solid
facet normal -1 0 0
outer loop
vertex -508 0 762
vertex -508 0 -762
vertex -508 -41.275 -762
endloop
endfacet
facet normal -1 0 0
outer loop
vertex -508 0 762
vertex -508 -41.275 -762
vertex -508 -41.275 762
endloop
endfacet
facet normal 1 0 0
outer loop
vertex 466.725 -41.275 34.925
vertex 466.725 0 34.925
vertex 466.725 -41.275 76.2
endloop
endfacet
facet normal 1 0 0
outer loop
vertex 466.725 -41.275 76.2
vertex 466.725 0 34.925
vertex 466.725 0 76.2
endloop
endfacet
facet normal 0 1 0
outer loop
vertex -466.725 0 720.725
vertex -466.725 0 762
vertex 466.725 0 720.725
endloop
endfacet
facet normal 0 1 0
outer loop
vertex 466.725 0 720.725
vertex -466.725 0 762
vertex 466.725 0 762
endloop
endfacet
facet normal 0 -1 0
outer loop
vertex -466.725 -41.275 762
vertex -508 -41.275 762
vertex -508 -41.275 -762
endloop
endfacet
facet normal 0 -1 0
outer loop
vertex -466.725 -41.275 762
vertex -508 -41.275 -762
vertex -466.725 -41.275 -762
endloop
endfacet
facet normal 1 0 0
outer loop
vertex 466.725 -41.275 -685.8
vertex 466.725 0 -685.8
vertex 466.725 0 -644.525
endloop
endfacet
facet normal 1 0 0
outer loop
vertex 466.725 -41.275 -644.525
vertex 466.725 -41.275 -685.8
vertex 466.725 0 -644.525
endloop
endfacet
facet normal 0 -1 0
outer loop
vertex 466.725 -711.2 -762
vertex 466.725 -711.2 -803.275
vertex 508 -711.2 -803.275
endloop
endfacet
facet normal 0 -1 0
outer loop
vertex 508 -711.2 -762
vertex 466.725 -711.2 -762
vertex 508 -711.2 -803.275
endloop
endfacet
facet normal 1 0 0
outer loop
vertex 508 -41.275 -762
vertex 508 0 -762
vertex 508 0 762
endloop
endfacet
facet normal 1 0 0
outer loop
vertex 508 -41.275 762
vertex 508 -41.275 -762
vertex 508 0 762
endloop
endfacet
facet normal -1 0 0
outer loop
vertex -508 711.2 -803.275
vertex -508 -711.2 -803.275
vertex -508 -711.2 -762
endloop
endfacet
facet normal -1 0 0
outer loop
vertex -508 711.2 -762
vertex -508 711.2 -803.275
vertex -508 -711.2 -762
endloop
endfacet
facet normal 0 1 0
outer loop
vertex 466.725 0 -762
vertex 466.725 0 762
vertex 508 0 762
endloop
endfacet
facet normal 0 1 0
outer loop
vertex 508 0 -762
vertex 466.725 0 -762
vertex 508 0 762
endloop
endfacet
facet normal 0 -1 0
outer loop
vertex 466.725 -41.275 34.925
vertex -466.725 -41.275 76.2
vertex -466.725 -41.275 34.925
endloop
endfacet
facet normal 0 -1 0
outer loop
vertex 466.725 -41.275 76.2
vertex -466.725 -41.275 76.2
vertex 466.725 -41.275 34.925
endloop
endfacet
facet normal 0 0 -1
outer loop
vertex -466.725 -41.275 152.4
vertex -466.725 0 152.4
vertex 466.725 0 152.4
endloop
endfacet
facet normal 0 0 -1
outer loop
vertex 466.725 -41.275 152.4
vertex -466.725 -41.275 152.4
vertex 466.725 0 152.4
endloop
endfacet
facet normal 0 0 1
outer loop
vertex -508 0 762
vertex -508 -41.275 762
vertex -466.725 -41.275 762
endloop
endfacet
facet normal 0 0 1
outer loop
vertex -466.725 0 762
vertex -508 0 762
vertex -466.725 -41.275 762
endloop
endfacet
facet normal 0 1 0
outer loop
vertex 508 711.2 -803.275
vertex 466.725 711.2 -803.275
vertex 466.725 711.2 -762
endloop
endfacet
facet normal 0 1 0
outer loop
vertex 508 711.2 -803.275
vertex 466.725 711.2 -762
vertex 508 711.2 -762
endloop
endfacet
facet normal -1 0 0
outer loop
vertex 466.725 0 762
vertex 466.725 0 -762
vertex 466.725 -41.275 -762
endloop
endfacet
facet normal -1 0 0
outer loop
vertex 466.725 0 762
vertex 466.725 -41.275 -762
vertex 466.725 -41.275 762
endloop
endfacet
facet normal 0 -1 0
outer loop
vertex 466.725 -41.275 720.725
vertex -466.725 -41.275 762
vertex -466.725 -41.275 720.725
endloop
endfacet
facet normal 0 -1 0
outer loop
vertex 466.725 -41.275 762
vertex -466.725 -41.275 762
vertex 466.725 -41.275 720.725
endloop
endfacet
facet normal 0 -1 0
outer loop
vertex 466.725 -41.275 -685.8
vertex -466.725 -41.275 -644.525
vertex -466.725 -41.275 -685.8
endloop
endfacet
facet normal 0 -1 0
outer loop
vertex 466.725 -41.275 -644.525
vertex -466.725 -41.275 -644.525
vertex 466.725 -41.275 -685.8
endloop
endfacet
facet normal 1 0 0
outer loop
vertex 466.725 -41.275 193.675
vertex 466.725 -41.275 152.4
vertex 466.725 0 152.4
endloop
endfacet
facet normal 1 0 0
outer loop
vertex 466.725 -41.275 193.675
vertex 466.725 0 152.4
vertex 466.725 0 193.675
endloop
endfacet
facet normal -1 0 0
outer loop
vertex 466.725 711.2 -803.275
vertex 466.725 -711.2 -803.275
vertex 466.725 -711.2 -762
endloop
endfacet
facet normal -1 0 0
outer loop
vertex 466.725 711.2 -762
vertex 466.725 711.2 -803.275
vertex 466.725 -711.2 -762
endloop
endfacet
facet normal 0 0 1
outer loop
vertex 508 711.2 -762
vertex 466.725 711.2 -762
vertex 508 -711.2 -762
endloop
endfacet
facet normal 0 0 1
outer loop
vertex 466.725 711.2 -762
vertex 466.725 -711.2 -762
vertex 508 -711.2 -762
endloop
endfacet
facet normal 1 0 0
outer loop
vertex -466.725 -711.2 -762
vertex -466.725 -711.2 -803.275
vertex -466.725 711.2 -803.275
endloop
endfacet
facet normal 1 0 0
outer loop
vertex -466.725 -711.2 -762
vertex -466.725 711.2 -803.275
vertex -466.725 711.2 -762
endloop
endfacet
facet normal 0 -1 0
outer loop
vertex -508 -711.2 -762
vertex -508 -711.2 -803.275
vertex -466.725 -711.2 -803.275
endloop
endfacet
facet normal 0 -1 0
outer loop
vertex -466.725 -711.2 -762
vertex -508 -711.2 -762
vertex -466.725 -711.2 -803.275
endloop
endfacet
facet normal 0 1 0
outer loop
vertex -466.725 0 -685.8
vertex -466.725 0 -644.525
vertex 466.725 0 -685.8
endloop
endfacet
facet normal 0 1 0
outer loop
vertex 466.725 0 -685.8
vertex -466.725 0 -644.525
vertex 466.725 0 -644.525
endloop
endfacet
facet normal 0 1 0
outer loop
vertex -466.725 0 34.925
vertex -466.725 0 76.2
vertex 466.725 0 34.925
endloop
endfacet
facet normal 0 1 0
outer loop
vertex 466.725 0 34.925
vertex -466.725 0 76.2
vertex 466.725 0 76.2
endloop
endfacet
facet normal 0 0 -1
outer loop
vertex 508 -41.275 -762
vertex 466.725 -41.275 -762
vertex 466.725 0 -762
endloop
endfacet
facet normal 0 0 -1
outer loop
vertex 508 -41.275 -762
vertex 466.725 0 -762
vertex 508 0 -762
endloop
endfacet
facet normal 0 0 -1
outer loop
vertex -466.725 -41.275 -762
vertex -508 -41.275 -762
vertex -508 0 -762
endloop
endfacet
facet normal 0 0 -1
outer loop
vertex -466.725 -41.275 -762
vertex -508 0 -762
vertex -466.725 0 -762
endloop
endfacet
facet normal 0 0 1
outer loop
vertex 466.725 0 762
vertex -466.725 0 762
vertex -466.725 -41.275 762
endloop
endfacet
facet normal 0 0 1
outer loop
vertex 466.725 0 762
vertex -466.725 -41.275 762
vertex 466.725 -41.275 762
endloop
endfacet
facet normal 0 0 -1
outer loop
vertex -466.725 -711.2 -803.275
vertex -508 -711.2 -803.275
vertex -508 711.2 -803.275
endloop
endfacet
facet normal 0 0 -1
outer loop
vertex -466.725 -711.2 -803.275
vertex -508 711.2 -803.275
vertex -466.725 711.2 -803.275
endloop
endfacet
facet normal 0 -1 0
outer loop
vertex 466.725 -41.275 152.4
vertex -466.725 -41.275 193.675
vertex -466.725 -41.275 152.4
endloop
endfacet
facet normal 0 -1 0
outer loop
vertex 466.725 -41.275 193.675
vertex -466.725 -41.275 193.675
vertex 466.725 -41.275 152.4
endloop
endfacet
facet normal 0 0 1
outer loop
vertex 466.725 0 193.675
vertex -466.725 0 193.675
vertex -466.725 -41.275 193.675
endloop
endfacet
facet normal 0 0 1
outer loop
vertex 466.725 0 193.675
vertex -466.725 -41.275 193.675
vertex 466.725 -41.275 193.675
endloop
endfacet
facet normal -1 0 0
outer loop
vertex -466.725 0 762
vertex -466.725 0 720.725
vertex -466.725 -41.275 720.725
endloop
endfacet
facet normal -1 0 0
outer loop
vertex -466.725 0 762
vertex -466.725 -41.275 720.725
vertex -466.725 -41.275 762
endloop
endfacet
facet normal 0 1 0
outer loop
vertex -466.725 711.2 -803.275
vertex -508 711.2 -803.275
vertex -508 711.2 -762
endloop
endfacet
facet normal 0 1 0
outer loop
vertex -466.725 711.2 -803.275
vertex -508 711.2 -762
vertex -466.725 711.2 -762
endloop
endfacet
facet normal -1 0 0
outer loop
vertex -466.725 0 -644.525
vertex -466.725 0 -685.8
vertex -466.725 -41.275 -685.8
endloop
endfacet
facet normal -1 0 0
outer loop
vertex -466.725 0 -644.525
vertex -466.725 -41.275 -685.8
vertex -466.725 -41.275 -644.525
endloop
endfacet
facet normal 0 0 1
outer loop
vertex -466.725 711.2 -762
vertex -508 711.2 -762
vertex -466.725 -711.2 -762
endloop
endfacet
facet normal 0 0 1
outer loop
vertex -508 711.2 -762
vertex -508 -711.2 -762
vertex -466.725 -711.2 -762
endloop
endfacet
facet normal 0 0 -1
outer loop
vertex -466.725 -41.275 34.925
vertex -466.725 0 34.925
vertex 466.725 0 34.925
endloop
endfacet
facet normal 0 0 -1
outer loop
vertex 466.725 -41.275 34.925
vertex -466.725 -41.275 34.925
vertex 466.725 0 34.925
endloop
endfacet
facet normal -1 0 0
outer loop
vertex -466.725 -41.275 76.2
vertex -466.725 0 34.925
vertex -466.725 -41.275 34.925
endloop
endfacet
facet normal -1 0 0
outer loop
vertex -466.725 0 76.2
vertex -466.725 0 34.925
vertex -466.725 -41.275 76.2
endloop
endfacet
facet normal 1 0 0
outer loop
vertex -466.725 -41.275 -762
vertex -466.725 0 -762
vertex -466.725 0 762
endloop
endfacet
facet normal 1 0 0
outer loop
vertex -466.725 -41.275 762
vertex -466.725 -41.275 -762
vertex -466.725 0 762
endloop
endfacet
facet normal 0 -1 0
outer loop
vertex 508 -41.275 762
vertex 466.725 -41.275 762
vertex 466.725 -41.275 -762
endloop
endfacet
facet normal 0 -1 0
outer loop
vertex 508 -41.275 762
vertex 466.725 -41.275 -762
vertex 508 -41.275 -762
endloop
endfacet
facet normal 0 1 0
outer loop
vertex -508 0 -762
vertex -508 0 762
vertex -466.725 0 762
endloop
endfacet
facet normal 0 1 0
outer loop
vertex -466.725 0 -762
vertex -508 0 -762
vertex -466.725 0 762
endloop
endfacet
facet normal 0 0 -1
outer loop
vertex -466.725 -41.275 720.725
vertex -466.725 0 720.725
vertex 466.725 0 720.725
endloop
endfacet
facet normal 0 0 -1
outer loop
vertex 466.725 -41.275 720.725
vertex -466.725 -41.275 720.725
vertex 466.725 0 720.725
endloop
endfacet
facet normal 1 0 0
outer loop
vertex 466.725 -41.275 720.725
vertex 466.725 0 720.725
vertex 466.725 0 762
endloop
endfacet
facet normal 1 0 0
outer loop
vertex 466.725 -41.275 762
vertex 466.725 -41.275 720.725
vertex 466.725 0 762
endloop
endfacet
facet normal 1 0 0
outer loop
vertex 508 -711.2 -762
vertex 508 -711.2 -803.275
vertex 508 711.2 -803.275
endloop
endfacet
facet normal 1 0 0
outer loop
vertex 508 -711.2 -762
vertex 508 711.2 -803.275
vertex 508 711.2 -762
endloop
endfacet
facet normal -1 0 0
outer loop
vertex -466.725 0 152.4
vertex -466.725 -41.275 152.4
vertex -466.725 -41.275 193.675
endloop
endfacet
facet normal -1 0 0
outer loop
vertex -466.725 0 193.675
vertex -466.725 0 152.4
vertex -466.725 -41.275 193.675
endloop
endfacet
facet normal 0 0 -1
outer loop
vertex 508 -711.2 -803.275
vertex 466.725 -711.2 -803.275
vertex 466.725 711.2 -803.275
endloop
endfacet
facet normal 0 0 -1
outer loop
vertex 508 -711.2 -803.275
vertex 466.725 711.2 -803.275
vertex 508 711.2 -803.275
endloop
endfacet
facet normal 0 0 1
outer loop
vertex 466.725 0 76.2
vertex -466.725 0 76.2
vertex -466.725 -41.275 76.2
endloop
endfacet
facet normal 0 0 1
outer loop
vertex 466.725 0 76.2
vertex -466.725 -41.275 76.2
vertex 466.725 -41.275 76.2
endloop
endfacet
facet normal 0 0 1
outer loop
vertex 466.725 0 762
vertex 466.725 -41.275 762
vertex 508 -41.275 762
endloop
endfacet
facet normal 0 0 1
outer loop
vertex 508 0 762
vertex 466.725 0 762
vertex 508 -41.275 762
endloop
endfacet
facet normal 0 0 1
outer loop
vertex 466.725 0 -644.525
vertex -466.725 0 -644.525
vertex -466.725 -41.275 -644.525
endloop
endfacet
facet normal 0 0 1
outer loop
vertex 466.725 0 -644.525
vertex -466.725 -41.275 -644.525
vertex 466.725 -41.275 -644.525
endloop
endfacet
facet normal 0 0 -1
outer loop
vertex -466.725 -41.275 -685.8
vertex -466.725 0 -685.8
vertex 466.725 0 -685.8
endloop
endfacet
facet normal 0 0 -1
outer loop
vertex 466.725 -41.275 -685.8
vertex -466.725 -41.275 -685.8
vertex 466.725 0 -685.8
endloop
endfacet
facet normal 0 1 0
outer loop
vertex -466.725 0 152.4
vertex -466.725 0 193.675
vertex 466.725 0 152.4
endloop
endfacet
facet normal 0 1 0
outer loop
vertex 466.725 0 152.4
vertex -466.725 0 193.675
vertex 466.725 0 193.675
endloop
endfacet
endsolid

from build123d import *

# Parameters (mm, degrees)
F0_W          = 41.275
F0_H          = 1524
F1_DEPTH      = 41.275
F2_W          = 933.45
F2_H          = 41.275
F3_DEPTH      = 41.275
F4_W          = 41.275
F4_H          = 41.275
F5_DEPTH      = 711.2
F5_DEPTH_BACK = 711.2


with BuildPart() as f1:
    # F0 (on Front) → F1 (new body)
    with BuildSketch(Plane.XZ):
        with Locations((-487.3625, 0)):
            Rectangle(F0_W, F0_H)
        with Locations((487.3625, 0)):
            Rectangle(F0_W, F0_H)
    extrude(amount=F1_DEPTH)


with BuildPart() as f3:
    # F2 (on Front) → F3 (new body)
    with BuildSketch(Plane.XZ):
        with Locations((0, 741.3625)):
            Rectangle(F2_W, F2_H)
        with Locations((0, 173.0375)):
            Rectangle(F2_W, F2_H)
        with Locations((0, 55.5625)):
            Rectangle(F2_W, F2_H)
        with Locations((0, -665.1625)):
            Rectangle(F2_W, F2_H)
    extrude(amount=F3_DEPTH)


with BuildPart() as f5:
    # F4 (on Front) → F5 (new body, two sides)
    with BuildSketch(Plane.XZ) as f5_sk:
        with Locations((-487.3625, -782.6375)):
            Rectangle(F4_W, F4_H)
        with Locations((487.3625, -782.6375)):
            Rectangle(F4_W, F4_H)
    extrude(amount=F5_DEPTH)
    extrude(f5_sk.sketch, amount=-F5_DEPTH_BACK)


solid = Compound([f1.part, f3.part, f5.part])
